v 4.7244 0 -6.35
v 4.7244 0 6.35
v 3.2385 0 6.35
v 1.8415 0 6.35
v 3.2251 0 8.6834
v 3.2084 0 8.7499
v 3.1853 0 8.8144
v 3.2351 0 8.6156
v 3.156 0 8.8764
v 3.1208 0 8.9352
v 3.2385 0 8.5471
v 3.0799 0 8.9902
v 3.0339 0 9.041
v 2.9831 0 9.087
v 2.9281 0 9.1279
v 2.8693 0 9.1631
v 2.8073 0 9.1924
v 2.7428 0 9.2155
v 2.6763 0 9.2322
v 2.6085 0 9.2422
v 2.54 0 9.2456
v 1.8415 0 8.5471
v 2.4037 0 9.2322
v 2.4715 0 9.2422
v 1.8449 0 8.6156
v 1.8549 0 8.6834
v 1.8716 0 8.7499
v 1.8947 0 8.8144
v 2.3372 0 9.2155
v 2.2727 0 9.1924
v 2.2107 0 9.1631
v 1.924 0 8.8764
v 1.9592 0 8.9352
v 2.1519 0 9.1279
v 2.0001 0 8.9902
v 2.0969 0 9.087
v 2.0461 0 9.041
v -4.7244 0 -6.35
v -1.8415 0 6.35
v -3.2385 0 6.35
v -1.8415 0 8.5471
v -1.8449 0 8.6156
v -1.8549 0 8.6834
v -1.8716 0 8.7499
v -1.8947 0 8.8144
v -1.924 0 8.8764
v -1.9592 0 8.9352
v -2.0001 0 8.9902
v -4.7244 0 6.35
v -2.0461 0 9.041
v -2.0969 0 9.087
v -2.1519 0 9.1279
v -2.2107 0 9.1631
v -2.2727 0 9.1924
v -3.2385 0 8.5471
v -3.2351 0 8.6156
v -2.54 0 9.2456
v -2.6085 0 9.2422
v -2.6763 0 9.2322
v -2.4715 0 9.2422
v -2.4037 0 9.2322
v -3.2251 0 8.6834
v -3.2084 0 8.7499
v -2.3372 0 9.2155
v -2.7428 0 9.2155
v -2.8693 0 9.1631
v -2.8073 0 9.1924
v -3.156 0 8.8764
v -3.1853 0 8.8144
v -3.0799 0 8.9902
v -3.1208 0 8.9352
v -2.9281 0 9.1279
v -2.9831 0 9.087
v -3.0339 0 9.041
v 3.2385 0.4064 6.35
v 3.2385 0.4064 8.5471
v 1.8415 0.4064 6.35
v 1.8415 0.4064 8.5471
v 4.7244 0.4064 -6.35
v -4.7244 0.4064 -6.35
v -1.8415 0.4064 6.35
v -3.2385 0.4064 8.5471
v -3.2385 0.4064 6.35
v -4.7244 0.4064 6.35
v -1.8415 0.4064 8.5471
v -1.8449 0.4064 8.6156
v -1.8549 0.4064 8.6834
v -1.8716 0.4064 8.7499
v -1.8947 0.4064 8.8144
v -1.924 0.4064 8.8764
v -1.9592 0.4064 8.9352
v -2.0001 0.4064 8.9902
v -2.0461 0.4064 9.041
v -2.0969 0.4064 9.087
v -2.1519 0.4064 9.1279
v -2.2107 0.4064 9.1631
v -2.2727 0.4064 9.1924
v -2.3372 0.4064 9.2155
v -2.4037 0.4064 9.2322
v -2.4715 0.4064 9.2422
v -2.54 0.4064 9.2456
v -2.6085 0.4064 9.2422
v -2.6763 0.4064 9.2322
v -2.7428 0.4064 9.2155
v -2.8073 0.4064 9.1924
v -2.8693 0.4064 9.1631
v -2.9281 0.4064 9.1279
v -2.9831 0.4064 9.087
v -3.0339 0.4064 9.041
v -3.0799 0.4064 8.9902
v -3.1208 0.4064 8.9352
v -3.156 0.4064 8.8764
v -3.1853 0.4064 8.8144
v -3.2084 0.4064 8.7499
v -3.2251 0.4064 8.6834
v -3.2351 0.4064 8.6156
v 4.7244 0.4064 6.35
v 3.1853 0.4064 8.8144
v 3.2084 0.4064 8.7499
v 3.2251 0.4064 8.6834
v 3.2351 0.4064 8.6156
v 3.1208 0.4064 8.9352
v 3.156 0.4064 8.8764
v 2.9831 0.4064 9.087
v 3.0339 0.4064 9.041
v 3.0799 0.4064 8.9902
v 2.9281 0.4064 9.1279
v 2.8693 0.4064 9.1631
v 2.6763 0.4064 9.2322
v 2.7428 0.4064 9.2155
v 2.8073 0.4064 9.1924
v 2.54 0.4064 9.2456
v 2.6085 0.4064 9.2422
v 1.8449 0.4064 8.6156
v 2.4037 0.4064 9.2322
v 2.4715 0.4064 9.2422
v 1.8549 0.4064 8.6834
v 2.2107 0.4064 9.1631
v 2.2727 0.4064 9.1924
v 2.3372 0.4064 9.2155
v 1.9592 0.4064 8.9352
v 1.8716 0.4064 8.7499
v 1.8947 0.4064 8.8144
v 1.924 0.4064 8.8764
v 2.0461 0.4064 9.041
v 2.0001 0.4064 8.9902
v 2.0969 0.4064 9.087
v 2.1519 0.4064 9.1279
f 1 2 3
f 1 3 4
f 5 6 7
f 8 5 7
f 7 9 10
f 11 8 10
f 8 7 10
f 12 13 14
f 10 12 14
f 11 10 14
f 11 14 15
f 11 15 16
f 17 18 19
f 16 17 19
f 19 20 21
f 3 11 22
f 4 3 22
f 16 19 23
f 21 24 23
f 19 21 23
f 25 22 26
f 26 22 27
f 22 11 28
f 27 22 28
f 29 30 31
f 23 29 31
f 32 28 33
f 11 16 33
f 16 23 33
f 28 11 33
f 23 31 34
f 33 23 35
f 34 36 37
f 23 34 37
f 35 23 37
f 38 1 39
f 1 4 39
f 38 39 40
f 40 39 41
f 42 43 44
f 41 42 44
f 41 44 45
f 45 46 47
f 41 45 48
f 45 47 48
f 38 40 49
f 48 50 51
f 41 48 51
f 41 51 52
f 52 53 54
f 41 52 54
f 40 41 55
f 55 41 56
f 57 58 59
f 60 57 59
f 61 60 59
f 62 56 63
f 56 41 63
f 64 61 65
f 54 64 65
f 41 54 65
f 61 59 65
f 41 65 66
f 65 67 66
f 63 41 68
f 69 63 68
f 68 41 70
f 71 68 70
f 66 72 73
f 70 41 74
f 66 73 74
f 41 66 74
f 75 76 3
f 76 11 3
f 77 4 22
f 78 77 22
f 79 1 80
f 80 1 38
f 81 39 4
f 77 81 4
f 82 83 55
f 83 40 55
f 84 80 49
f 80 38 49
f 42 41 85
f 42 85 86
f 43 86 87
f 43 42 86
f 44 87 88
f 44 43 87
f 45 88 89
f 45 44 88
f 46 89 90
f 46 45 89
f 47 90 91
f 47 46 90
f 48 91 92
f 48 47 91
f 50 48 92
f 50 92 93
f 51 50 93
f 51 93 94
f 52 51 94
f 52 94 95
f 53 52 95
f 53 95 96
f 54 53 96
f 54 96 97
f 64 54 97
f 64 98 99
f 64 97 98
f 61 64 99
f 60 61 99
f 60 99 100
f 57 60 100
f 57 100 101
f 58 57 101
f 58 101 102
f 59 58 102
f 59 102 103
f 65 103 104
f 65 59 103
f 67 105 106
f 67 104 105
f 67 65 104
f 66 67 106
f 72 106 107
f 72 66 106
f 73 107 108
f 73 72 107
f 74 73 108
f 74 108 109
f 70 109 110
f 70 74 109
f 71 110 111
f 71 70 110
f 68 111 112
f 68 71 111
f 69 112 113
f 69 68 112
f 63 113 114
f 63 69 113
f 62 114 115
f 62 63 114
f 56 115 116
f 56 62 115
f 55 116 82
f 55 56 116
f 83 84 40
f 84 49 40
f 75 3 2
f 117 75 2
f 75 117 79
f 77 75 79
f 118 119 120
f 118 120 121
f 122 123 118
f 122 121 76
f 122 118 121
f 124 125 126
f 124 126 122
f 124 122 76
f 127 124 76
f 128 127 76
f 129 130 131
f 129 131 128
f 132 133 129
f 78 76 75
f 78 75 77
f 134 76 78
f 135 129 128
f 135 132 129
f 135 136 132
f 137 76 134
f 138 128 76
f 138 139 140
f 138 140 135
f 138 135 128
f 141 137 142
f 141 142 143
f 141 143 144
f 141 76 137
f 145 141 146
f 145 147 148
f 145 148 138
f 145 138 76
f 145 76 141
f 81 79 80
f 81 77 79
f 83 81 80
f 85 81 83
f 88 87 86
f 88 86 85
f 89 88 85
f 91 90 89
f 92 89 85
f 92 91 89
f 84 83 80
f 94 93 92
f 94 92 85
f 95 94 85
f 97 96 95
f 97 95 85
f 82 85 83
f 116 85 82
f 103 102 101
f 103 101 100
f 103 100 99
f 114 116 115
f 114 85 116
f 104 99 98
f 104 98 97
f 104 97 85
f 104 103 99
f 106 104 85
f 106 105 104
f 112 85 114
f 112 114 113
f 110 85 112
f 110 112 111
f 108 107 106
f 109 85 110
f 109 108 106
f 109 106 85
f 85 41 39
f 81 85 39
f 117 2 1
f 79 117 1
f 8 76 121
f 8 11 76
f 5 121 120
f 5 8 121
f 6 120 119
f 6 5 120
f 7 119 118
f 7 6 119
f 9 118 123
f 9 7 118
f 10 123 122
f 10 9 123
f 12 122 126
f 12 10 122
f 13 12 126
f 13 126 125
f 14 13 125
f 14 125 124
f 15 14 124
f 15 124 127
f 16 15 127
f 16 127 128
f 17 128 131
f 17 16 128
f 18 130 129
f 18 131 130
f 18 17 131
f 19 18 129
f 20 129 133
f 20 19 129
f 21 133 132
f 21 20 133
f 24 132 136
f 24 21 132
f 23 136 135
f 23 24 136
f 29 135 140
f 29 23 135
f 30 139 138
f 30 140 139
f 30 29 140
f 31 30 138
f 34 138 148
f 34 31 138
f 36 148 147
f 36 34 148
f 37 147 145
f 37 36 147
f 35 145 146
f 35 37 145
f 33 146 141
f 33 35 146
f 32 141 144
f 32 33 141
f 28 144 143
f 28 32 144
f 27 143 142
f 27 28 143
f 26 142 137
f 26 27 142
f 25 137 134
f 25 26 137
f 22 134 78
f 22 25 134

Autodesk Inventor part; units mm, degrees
sketch "Sketch_1" plane through (0, 0, 0) normal (0, 1, 0) x (-1, 0, 0)
  line L0 (4.7244, 6.35) -> (3.2385, 6.35)
  line L1 (3.2385, 6.35) -> (3.2385, 8.5471)
  arc A0 (3.2385, 8.5471) -> (1.8415, 8.5471) centre (2.54, 8.5471) ccw
  line L2 (1.8415, 8.5471) -> (1.8415, 6.35)
  line L3 (1.8415, 6.35) -> (-1.8415, 6.35)
  line L4 (-1.8415, 6.35) -> (-1.8415, 8.5471)
  arc A1 (-1.8415, 8.5471) -> (-3.2385, 8.5471) centre (-2.54, 8.5471) ccw
  line L5 (-3.2385, 8.5471) -> (-3.2385, 6.35)
  line L6 (-3.2385, 6.35) -> (-4.7244, 6.35)
  line L7 (-4.7244, 6.35) -> (-4.7244, -6.35)
  line L8 (-4.7244, -6.35) -> (4.7244, -6.35)
  line L9 (4.7244, -6.35) -> (4.7244, 6.35)
extrude "Extrusion1" add sketch "Sketch_1" along normal blind 0.4064
ref_plane "shtrmnl_XY" through (0, 0, 0) normal (0, 1, 0) x (1, 0, 0)
ref_plane "shtrmnl_YZ" through (0, 0, 0) normal (1, 0, 0) x (0, 0, -1)
ref_plane "shtrmnl_ZX" through (0, 0, 0) normal (0, 0, -1) x (0, 1, 0)
properties part number "M202830TX-switch"
